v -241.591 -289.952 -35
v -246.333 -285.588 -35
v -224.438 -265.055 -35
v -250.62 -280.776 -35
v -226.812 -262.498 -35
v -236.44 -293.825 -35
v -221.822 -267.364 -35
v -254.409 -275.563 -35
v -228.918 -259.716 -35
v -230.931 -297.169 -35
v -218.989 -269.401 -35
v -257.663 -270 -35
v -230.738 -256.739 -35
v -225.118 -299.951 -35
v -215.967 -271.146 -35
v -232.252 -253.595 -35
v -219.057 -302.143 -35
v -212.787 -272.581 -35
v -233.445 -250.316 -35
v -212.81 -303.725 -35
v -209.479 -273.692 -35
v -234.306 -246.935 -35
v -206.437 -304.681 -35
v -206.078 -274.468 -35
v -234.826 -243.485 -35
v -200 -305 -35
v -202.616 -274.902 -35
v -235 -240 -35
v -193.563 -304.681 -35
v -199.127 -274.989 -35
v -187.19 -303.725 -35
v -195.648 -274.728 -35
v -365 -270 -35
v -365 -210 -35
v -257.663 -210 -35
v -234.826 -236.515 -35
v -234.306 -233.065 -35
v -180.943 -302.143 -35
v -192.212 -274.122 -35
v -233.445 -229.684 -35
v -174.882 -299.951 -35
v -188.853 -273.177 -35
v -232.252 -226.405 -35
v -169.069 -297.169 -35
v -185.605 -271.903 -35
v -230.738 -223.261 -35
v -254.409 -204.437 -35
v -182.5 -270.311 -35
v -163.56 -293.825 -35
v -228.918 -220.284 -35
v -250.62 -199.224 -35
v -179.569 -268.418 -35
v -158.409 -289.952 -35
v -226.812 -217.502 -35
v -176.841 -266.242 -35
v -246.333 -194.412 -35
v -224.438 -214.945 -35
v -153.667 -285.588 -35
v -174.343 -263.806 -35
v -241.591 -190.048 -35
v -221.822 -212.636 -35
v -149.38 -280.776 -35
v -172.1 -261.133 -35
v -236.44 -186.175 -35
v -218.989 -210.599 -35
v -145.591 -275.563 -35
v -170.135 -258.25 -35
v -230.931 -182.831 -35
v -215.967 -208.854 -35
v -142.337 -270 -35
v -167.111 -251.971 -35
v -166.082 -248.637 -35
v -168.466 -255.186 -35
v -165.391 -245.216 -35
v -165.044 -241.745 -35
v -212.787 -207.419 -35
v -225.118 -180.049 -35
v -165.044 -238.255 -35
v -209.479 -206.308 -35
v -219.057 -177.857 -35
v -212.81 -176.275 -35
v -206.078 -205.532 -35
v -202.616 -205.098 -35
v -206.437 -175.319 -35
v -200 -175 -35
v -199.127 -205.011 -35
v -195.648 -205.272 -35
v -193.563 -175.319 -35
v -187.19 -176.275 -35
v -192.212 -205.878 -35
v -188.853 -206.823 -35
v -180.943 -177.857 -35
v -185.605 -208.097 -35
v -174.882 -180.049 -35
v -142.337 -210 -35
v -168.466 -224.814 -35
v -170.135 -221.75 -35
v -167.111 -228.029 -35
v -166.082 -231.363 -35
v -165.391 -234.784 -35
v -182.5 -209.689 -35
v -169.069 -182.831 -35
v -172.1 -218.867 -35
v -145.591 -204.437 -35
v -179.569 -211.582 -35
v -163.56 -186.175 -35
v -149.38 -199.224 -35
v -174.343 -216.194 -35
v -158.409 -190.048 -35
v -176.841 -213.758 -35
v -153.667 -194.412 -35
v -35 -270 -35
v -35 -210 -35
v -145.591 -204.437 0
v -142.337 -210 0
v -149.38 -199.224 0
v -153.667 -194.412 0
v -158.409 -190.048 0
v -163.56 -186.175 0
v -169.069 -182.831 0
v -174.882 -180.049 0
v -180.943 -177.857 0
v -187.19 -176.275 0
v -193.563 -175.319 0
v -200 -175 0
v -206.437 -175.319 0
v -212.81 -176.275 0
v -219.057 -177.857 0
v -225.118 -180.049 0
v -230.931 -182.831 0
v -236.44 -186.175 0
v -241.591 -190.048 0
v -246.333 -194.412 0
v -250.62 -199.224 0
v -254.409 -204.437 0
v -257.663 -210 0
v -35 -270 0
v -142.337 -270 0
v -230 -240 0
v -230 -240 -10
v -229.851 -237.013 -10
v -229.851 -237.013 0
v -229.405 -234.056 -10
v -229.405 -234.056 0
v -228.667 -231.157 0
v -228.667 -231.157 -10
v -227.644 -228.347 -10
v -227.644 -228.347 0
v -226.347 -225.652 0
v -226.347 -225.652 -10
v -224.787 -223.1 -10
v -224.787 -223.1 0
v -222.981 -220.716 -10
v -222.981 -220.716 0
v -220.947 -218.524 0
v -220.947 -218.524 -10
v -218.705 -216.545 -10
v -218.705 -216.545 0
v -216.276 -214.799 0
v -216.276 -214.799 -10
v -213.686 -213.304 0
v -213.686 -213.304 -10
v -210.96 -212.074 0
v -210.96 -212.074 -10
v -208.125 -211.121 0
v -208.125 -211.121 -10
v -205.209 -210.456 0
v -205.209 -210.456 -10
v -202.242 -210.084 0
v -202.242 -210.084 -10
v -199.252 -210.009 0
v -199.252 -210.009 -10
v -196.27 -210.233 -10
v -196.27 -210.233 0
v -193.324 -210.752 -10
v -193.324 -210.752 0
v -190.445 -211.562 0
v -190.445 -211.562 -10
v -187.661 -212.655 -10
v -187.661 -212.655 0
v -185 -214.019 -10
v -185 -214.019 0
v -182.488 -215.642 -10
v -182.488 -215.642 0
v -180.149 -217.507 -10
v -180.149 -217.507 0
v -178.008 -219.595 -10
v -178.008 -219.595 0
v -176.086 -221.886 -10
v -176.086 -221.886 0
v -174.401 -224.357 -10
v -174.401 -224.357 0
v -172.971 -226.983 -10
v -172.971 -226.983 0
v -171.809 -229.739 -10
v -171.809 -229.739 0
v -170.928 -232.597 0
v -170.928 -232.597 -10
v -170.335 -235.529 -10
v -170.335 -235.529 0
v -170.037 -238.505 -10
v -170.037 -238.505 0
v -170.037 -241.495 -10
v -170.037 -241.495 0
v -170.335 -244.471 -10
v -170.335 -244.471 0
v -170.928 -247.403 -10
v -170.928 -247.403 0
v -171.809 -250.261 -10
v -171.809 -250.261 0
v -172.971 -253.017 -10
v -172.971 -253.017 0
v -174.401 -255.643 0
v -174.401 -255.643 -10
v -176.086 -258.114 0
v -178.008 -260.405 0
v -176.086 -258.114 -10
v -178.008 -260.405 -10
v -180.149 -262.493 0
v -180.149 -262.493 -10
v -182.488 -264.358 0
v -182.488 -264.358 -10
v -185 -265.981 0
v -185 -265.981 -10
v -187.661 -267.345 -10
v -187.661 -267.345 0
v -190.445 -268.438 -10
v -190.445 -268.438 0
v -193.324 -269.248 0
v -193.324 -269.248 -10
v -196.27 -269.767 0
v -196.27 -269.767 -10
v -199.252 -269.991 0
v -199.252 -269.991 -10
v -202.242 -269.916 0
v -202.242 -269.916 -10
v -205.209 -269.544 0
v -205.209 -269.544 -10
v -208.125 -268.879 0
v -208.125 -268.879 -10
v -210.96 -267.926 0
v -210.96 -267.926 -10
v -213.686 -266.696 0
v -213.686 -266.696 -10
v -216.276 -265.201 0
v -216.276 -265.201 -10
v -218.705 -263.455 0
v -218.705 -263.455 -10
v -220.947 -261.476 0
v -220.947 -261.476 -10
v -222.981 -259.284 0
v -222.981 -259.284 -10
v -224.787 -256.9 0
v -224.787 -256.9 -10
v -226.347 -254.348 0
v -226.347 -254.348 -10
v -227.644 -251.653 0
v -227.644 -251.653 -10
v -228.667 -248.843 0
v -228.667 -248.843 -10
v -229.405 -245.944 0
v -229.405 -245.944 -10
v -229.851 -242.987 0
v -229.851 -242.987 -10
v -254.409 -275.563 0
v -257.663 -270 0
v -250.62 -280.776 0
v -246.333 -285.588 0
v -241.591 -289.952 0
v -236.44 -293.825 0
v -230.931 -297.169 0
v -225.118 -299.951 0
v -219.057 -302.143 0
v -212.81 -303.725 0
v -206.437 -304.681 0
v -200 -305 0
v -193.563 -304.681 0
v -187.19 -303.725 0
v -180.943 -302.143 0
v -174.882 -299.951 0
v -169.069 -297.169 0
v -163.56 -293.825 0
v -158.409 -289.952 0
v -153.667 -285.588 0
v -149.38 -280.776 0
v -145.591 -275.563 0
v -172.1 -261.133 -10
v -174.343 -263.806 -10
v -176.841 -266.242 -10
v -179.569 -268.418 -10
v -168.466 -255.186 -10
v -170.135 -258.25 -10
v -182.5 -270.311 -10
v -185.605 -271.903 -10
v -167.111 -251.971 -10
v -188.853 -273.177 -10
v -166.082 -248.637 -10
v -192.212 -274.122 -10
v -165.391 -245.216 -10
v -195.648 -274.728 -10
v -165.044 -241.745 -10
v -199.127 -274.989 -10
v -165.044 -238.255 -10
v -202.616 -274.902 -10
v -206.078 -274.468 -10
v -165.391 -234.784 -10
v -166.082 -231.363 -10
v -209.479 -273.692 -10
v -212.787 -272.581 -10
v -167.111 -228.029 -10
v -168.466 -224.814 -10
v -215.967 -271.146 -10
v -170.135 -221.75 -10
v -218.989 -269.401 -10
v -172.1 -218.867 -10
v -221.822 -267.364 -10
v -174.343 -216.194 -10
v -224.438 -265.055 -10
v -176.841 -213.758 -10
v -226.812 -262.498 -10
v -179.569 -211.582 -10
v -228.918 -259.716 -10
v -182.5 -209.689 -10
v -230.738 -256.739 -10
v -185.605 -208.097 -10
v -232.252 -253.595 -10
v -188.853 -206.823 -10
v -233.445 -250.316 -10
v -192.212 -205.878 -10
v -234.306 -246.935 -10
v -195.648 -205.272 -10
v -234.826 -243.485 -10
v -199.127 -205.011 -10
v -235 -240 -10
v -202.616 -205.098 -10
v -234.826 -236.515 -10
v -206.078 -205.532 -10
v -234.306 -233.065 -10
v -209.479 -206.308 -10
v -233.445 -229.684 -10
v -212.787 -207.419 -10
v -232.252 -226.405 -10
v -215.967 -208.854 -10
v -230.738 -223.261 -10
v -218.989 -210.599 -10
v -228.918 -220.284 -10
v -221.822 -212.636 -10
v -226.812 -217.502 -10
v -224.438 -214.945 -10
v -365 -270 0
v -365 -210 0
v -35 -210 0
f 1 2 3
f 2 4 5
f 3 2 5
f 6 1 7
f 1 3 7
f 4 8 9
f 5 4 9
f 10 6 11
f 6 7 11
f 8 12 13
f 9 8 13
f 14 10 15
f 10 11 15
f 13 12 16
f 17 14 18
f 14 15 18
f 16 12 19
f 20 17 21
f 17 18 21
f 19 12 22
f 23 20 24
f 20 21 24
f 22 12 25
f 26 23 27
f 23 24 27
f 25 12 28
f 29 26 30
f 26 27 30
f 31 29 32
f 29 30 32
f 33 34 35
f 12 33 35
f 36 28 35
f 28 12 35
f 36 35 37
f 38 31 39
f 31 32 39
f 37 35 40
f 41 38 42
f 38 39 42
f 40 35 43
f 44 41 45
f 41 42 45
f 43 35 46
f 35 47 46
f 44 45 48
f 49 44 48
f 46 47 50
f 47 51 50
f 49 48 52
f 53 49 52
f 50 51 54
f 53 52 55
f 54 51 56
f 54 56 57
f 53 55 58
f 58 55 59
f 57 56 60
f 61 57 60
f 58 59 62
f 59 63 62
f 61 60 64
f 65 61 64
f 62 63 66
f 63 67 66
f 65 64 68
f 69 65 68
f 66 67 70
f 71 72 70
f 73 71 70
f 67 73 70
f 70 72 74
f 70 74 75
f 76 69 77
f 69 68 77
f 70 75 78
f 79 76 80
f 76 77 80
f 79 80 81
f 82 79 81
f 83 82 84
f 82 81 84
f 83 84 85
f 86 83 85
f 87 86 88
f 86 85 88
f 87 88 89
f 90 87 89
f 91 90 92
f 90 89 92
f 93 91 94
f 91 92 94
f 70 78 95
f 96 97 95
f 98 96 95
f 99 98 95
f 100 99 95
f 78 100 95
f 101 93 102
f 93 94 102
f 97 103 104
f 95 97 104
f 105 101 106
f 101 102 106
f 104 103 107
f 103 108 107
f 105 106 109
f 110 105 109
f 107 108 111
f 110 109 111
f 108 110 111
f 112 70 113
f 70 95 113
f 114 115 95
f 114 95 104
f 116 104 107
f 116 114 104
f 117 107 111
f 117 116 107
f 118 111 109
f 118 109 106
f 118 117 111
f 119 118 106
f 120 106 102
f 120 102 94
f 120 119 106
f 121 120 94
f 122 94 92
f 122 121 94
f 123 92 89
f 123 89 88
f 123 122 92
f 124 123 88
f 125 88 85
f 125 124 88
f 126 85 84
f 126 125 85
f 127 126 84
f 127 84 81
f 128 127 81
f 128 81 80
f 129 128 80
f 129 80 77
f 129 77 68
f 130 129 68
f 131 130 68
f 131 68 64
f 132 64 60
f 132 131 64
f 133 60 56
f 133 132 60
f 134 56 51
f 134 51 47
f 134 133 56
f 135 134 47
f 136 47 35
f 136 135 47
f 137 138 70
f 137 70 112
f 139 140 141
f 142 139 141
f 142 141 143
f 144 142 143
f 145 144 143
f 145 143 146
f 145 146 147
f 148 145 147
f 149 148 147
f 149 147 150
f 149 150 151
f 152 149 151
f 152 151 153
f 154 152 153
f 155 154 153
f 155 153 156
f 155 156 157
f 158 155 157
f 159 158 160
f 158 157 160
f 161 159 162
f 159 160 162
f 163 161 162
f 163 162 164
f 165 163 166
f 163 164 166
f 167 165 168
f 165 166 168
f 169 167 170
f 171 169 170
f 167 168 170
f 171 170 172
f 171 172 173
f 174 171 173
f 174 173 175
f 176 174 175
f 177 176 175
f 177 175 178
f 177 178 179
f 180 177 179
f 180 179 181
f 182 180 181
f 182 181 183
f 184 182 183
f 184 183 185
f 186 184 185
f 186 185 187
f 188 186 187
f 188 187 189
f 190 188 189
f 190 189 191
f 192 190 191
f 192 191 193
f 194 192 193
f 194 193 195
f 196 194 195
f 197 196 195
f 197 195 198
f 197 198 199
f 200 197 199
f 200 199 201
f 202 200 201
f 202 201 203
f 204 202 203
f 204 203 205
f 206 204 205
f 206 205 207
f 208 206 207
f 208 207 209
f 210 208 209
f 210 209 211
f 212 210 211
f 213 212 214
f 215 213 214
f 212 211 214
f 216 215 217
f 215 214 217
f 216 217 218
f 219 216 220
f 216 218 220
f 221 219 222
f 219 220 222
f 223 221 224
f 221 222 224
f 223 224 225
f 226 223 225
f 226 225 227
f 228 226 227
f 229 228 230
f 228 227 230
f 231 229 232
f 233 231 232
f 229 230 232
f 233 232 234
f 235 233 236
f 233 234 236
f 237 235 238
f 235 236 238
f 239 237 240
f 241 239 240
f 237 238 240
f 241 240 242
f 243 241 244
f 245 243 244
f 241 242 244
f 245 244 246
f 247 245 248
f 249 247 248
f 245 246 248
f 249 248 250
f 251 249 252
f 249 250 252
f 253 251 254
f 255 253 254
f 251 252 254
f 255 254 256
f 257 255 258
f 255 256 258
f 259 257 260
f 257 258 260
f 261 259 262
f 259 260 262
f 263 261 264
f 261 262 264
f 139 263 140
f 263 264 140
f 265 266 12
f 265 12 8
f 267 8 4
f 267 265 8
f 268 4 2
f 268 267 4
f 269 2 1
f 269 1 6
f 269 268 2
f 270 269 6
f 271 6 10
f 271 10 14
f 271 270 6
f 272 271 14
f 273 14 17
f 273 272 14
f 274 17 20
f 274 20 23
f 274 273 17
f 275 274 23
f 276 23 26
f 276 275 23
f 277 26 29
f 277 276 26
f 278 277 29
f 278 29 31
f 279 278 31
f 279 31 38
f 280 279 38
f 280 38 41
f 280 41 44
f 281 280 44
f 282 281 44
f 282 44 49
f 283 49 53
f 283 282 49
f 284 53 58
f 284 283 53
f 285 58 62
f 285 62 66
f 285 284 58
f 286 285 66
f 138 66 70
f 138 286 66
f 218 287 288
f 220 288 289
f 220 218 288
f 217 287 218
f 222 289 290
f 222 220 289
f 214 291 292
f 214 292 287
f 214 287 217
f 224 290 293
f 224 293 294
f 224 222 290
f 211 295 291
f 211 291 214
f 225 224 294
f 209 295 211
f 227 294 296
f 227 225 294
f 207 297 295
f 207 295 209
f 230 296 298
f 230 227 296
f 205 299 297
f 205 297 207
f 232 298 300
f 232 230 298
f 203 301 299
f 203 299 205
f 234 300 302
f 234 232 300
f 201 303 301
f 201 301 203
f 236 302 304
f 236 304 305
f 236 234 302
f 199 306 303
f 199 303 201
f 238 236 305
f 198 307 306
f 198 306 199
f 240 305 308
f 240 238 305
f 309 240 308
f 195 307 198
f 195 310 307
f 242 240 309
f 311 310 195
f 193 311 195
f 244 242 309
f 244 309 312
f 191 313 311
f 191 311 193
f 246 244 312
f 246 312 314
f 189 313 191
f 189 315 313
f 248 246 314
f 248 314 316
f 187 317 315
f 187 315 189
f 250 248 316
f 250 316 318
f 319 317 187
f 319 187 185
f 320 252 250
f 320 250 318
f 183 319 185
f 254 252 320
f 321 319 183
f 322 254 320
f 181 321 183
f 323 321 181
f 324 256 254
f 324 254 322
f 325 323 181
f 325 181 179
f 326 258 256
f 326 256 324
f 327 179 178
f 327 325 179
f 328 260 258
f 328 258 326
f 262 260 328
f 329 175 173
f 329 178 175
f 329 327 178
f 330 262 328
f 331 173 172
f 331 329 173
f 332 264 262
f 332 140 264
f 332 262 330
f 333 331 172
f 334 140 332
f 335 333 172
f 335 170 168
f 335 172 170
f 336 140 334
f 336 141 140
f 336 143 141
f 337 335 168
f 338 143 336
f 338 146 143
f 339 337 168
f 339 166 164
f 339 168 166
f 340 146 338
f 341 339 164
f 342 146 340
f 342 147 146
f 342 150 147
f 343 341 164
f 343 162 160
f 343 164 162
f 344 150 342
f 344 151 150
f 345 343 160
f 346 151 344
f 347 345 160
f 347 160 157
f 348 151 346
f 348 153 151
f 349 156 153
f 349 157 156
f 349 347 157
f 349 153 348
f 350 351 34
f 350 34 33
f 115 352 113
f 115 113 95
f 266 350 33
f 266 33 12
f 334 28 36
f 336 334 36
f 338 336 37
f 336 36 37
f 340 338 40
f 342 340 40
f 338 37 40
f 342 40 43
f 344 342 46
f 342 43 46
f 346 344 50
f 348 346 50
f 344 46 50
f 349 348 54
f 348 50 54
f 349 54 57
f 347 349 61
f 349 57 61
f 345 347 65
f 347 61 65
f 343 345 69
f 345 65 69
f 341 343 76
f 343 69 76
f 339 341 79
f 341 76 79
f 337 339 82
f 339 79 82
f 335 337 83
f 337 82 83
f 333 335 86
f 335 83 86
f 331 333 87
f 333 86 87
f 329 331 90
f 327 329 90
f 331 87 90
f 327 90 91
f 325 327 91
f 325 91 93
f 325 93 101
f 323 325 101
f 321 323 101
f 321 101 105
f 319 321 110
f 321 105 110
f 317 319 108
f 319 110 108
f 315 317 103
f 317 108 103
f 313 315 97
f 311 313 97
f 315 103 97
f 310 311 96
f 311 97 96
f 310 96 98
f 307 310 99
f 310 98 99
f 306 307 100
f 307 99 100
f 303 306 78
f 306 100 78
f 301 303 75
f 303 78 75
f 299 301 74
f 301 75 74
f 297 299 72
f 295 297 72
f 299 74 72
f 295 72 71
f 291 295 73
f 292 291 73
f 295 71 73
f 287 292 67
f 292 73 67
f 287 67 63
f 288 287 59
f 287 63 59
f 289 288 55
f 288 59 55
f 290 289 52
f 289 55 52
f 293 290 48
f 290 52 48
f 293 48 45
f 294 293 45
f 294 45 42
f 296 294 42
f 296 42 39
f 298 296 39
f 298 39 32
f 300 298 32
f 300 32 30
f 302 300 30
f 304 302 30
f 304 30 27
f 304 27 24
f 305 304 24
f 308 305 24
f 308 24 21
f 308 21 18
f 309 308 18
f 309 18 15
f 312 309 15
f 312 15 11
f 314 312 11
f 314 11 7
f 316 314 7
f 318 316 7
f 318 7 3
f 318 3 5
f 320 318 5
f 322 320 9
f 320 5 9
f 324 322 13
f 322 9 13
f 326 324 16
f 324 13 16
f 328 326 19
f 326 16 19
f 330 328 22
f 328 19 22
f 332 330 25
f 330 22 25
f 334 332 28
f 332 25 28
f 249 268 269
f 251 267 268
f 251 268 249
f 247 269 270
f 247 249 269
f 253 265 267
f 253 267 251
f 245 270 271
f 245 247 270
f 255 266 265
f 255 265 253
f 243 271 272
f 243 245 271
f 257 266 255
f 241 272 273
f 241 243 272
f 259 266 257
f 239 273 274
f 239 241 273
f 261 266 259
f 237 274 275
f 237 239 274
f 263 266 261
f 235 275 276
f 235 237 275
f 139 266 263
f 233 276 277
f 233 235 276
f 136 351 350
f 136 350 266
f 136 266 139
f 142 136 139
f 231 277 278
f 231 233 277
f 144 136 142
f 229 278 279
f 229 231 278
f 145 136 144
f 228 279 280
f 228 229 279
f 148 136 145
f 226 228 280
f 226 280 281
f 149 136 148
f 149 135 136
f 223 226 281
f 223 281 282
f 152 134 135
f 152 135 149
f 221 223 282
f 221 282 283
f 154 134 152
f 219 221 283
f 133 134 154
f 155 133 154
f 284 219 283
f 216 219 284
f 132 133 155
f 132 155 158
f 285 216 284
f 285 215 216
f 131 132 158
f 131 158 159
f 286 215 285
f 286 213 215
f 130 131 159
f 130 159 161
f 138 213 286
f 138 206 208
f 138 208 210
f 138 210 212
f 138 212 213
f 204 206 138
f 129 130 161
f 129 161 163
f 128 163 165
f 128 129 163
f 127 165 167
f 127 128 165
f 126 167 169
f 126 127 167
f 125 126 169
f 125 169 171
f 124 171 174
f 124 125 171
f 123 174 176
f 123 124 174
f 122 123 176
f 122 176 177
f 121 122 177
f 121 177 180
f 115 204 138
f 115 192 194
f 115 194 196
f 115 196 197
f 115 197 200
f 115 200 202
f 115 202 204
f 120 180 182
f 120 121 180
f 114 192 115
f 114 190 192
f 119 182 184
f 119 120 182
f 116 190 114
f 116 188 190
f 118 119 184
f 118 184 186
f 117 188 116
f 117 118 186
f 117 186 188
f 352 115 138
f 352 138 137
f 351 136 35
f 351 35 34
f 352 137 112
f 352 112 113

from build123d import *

# Parameters (mm, degrees)
RESSALTO_EXTRUS_O1_DEPTH = 35
ESBO_O2_R                = 35
CORTE_EXTRUS_O1_DEPTH    = 25
ESBO_O3_R                = 30
CORTE_EXTRUS_O2_DEPTH    = 477.313972081


with BuildPart() as part:
    # Esboço1 → Ressalto-extrusão1 (new body)
    with BuildSketch(Plane.XY):
        with BuildLine():
            Line((-257.662812973, -210), (-365, -210))
            Line((-365, -210), (-365, -270))
            Line((-365, -270), (-257.662812973, -270))
            ThreePointArc((-257.662812973, -270), (-200, -305), (-142.337187027, -270))
            Line((-142.337187027, -270), (-35, -270))
            Line((-35, -270), (-35, -210))
            Line((-35, -210), (-142.337187027, -210))
            ThreePointArc((-142.337187027, -210), (-200, -175), (-257.662812973, -210))
        make_face()
    extrude(amount=-RESSALTO_EXTRUS_O1_DEPTH)

    # Esboço2 → Corte-extrusão1 (cut)
    with BuildSketch(Plane(origin=(0, 0, -35), x_dir=(-1, 0, 0), z_dir=(0, 0, -1))):
        with Locations((200, -240)):
            Circle(ESBO_O2_R)
    extrude(amount=-CORTE_EXTRUS_O1_DEPTH, mode=Mode.SUBTRACT)

    # Esboço3 → Corte-extrusão2 (cut, through all)
    with BuildSketch(Plane(origin=(0, 0, -10), x_dir=(-1, 0, 0), z_dir=(0, 0, -1))):
        with Locations((200, -240)):
            Circle(ESBO_O3_R)
    extrude(amount=-CORTE_EXTRUS_O2_DEPTH, mode=Mode.SUBTRACT)


solid = part.part
